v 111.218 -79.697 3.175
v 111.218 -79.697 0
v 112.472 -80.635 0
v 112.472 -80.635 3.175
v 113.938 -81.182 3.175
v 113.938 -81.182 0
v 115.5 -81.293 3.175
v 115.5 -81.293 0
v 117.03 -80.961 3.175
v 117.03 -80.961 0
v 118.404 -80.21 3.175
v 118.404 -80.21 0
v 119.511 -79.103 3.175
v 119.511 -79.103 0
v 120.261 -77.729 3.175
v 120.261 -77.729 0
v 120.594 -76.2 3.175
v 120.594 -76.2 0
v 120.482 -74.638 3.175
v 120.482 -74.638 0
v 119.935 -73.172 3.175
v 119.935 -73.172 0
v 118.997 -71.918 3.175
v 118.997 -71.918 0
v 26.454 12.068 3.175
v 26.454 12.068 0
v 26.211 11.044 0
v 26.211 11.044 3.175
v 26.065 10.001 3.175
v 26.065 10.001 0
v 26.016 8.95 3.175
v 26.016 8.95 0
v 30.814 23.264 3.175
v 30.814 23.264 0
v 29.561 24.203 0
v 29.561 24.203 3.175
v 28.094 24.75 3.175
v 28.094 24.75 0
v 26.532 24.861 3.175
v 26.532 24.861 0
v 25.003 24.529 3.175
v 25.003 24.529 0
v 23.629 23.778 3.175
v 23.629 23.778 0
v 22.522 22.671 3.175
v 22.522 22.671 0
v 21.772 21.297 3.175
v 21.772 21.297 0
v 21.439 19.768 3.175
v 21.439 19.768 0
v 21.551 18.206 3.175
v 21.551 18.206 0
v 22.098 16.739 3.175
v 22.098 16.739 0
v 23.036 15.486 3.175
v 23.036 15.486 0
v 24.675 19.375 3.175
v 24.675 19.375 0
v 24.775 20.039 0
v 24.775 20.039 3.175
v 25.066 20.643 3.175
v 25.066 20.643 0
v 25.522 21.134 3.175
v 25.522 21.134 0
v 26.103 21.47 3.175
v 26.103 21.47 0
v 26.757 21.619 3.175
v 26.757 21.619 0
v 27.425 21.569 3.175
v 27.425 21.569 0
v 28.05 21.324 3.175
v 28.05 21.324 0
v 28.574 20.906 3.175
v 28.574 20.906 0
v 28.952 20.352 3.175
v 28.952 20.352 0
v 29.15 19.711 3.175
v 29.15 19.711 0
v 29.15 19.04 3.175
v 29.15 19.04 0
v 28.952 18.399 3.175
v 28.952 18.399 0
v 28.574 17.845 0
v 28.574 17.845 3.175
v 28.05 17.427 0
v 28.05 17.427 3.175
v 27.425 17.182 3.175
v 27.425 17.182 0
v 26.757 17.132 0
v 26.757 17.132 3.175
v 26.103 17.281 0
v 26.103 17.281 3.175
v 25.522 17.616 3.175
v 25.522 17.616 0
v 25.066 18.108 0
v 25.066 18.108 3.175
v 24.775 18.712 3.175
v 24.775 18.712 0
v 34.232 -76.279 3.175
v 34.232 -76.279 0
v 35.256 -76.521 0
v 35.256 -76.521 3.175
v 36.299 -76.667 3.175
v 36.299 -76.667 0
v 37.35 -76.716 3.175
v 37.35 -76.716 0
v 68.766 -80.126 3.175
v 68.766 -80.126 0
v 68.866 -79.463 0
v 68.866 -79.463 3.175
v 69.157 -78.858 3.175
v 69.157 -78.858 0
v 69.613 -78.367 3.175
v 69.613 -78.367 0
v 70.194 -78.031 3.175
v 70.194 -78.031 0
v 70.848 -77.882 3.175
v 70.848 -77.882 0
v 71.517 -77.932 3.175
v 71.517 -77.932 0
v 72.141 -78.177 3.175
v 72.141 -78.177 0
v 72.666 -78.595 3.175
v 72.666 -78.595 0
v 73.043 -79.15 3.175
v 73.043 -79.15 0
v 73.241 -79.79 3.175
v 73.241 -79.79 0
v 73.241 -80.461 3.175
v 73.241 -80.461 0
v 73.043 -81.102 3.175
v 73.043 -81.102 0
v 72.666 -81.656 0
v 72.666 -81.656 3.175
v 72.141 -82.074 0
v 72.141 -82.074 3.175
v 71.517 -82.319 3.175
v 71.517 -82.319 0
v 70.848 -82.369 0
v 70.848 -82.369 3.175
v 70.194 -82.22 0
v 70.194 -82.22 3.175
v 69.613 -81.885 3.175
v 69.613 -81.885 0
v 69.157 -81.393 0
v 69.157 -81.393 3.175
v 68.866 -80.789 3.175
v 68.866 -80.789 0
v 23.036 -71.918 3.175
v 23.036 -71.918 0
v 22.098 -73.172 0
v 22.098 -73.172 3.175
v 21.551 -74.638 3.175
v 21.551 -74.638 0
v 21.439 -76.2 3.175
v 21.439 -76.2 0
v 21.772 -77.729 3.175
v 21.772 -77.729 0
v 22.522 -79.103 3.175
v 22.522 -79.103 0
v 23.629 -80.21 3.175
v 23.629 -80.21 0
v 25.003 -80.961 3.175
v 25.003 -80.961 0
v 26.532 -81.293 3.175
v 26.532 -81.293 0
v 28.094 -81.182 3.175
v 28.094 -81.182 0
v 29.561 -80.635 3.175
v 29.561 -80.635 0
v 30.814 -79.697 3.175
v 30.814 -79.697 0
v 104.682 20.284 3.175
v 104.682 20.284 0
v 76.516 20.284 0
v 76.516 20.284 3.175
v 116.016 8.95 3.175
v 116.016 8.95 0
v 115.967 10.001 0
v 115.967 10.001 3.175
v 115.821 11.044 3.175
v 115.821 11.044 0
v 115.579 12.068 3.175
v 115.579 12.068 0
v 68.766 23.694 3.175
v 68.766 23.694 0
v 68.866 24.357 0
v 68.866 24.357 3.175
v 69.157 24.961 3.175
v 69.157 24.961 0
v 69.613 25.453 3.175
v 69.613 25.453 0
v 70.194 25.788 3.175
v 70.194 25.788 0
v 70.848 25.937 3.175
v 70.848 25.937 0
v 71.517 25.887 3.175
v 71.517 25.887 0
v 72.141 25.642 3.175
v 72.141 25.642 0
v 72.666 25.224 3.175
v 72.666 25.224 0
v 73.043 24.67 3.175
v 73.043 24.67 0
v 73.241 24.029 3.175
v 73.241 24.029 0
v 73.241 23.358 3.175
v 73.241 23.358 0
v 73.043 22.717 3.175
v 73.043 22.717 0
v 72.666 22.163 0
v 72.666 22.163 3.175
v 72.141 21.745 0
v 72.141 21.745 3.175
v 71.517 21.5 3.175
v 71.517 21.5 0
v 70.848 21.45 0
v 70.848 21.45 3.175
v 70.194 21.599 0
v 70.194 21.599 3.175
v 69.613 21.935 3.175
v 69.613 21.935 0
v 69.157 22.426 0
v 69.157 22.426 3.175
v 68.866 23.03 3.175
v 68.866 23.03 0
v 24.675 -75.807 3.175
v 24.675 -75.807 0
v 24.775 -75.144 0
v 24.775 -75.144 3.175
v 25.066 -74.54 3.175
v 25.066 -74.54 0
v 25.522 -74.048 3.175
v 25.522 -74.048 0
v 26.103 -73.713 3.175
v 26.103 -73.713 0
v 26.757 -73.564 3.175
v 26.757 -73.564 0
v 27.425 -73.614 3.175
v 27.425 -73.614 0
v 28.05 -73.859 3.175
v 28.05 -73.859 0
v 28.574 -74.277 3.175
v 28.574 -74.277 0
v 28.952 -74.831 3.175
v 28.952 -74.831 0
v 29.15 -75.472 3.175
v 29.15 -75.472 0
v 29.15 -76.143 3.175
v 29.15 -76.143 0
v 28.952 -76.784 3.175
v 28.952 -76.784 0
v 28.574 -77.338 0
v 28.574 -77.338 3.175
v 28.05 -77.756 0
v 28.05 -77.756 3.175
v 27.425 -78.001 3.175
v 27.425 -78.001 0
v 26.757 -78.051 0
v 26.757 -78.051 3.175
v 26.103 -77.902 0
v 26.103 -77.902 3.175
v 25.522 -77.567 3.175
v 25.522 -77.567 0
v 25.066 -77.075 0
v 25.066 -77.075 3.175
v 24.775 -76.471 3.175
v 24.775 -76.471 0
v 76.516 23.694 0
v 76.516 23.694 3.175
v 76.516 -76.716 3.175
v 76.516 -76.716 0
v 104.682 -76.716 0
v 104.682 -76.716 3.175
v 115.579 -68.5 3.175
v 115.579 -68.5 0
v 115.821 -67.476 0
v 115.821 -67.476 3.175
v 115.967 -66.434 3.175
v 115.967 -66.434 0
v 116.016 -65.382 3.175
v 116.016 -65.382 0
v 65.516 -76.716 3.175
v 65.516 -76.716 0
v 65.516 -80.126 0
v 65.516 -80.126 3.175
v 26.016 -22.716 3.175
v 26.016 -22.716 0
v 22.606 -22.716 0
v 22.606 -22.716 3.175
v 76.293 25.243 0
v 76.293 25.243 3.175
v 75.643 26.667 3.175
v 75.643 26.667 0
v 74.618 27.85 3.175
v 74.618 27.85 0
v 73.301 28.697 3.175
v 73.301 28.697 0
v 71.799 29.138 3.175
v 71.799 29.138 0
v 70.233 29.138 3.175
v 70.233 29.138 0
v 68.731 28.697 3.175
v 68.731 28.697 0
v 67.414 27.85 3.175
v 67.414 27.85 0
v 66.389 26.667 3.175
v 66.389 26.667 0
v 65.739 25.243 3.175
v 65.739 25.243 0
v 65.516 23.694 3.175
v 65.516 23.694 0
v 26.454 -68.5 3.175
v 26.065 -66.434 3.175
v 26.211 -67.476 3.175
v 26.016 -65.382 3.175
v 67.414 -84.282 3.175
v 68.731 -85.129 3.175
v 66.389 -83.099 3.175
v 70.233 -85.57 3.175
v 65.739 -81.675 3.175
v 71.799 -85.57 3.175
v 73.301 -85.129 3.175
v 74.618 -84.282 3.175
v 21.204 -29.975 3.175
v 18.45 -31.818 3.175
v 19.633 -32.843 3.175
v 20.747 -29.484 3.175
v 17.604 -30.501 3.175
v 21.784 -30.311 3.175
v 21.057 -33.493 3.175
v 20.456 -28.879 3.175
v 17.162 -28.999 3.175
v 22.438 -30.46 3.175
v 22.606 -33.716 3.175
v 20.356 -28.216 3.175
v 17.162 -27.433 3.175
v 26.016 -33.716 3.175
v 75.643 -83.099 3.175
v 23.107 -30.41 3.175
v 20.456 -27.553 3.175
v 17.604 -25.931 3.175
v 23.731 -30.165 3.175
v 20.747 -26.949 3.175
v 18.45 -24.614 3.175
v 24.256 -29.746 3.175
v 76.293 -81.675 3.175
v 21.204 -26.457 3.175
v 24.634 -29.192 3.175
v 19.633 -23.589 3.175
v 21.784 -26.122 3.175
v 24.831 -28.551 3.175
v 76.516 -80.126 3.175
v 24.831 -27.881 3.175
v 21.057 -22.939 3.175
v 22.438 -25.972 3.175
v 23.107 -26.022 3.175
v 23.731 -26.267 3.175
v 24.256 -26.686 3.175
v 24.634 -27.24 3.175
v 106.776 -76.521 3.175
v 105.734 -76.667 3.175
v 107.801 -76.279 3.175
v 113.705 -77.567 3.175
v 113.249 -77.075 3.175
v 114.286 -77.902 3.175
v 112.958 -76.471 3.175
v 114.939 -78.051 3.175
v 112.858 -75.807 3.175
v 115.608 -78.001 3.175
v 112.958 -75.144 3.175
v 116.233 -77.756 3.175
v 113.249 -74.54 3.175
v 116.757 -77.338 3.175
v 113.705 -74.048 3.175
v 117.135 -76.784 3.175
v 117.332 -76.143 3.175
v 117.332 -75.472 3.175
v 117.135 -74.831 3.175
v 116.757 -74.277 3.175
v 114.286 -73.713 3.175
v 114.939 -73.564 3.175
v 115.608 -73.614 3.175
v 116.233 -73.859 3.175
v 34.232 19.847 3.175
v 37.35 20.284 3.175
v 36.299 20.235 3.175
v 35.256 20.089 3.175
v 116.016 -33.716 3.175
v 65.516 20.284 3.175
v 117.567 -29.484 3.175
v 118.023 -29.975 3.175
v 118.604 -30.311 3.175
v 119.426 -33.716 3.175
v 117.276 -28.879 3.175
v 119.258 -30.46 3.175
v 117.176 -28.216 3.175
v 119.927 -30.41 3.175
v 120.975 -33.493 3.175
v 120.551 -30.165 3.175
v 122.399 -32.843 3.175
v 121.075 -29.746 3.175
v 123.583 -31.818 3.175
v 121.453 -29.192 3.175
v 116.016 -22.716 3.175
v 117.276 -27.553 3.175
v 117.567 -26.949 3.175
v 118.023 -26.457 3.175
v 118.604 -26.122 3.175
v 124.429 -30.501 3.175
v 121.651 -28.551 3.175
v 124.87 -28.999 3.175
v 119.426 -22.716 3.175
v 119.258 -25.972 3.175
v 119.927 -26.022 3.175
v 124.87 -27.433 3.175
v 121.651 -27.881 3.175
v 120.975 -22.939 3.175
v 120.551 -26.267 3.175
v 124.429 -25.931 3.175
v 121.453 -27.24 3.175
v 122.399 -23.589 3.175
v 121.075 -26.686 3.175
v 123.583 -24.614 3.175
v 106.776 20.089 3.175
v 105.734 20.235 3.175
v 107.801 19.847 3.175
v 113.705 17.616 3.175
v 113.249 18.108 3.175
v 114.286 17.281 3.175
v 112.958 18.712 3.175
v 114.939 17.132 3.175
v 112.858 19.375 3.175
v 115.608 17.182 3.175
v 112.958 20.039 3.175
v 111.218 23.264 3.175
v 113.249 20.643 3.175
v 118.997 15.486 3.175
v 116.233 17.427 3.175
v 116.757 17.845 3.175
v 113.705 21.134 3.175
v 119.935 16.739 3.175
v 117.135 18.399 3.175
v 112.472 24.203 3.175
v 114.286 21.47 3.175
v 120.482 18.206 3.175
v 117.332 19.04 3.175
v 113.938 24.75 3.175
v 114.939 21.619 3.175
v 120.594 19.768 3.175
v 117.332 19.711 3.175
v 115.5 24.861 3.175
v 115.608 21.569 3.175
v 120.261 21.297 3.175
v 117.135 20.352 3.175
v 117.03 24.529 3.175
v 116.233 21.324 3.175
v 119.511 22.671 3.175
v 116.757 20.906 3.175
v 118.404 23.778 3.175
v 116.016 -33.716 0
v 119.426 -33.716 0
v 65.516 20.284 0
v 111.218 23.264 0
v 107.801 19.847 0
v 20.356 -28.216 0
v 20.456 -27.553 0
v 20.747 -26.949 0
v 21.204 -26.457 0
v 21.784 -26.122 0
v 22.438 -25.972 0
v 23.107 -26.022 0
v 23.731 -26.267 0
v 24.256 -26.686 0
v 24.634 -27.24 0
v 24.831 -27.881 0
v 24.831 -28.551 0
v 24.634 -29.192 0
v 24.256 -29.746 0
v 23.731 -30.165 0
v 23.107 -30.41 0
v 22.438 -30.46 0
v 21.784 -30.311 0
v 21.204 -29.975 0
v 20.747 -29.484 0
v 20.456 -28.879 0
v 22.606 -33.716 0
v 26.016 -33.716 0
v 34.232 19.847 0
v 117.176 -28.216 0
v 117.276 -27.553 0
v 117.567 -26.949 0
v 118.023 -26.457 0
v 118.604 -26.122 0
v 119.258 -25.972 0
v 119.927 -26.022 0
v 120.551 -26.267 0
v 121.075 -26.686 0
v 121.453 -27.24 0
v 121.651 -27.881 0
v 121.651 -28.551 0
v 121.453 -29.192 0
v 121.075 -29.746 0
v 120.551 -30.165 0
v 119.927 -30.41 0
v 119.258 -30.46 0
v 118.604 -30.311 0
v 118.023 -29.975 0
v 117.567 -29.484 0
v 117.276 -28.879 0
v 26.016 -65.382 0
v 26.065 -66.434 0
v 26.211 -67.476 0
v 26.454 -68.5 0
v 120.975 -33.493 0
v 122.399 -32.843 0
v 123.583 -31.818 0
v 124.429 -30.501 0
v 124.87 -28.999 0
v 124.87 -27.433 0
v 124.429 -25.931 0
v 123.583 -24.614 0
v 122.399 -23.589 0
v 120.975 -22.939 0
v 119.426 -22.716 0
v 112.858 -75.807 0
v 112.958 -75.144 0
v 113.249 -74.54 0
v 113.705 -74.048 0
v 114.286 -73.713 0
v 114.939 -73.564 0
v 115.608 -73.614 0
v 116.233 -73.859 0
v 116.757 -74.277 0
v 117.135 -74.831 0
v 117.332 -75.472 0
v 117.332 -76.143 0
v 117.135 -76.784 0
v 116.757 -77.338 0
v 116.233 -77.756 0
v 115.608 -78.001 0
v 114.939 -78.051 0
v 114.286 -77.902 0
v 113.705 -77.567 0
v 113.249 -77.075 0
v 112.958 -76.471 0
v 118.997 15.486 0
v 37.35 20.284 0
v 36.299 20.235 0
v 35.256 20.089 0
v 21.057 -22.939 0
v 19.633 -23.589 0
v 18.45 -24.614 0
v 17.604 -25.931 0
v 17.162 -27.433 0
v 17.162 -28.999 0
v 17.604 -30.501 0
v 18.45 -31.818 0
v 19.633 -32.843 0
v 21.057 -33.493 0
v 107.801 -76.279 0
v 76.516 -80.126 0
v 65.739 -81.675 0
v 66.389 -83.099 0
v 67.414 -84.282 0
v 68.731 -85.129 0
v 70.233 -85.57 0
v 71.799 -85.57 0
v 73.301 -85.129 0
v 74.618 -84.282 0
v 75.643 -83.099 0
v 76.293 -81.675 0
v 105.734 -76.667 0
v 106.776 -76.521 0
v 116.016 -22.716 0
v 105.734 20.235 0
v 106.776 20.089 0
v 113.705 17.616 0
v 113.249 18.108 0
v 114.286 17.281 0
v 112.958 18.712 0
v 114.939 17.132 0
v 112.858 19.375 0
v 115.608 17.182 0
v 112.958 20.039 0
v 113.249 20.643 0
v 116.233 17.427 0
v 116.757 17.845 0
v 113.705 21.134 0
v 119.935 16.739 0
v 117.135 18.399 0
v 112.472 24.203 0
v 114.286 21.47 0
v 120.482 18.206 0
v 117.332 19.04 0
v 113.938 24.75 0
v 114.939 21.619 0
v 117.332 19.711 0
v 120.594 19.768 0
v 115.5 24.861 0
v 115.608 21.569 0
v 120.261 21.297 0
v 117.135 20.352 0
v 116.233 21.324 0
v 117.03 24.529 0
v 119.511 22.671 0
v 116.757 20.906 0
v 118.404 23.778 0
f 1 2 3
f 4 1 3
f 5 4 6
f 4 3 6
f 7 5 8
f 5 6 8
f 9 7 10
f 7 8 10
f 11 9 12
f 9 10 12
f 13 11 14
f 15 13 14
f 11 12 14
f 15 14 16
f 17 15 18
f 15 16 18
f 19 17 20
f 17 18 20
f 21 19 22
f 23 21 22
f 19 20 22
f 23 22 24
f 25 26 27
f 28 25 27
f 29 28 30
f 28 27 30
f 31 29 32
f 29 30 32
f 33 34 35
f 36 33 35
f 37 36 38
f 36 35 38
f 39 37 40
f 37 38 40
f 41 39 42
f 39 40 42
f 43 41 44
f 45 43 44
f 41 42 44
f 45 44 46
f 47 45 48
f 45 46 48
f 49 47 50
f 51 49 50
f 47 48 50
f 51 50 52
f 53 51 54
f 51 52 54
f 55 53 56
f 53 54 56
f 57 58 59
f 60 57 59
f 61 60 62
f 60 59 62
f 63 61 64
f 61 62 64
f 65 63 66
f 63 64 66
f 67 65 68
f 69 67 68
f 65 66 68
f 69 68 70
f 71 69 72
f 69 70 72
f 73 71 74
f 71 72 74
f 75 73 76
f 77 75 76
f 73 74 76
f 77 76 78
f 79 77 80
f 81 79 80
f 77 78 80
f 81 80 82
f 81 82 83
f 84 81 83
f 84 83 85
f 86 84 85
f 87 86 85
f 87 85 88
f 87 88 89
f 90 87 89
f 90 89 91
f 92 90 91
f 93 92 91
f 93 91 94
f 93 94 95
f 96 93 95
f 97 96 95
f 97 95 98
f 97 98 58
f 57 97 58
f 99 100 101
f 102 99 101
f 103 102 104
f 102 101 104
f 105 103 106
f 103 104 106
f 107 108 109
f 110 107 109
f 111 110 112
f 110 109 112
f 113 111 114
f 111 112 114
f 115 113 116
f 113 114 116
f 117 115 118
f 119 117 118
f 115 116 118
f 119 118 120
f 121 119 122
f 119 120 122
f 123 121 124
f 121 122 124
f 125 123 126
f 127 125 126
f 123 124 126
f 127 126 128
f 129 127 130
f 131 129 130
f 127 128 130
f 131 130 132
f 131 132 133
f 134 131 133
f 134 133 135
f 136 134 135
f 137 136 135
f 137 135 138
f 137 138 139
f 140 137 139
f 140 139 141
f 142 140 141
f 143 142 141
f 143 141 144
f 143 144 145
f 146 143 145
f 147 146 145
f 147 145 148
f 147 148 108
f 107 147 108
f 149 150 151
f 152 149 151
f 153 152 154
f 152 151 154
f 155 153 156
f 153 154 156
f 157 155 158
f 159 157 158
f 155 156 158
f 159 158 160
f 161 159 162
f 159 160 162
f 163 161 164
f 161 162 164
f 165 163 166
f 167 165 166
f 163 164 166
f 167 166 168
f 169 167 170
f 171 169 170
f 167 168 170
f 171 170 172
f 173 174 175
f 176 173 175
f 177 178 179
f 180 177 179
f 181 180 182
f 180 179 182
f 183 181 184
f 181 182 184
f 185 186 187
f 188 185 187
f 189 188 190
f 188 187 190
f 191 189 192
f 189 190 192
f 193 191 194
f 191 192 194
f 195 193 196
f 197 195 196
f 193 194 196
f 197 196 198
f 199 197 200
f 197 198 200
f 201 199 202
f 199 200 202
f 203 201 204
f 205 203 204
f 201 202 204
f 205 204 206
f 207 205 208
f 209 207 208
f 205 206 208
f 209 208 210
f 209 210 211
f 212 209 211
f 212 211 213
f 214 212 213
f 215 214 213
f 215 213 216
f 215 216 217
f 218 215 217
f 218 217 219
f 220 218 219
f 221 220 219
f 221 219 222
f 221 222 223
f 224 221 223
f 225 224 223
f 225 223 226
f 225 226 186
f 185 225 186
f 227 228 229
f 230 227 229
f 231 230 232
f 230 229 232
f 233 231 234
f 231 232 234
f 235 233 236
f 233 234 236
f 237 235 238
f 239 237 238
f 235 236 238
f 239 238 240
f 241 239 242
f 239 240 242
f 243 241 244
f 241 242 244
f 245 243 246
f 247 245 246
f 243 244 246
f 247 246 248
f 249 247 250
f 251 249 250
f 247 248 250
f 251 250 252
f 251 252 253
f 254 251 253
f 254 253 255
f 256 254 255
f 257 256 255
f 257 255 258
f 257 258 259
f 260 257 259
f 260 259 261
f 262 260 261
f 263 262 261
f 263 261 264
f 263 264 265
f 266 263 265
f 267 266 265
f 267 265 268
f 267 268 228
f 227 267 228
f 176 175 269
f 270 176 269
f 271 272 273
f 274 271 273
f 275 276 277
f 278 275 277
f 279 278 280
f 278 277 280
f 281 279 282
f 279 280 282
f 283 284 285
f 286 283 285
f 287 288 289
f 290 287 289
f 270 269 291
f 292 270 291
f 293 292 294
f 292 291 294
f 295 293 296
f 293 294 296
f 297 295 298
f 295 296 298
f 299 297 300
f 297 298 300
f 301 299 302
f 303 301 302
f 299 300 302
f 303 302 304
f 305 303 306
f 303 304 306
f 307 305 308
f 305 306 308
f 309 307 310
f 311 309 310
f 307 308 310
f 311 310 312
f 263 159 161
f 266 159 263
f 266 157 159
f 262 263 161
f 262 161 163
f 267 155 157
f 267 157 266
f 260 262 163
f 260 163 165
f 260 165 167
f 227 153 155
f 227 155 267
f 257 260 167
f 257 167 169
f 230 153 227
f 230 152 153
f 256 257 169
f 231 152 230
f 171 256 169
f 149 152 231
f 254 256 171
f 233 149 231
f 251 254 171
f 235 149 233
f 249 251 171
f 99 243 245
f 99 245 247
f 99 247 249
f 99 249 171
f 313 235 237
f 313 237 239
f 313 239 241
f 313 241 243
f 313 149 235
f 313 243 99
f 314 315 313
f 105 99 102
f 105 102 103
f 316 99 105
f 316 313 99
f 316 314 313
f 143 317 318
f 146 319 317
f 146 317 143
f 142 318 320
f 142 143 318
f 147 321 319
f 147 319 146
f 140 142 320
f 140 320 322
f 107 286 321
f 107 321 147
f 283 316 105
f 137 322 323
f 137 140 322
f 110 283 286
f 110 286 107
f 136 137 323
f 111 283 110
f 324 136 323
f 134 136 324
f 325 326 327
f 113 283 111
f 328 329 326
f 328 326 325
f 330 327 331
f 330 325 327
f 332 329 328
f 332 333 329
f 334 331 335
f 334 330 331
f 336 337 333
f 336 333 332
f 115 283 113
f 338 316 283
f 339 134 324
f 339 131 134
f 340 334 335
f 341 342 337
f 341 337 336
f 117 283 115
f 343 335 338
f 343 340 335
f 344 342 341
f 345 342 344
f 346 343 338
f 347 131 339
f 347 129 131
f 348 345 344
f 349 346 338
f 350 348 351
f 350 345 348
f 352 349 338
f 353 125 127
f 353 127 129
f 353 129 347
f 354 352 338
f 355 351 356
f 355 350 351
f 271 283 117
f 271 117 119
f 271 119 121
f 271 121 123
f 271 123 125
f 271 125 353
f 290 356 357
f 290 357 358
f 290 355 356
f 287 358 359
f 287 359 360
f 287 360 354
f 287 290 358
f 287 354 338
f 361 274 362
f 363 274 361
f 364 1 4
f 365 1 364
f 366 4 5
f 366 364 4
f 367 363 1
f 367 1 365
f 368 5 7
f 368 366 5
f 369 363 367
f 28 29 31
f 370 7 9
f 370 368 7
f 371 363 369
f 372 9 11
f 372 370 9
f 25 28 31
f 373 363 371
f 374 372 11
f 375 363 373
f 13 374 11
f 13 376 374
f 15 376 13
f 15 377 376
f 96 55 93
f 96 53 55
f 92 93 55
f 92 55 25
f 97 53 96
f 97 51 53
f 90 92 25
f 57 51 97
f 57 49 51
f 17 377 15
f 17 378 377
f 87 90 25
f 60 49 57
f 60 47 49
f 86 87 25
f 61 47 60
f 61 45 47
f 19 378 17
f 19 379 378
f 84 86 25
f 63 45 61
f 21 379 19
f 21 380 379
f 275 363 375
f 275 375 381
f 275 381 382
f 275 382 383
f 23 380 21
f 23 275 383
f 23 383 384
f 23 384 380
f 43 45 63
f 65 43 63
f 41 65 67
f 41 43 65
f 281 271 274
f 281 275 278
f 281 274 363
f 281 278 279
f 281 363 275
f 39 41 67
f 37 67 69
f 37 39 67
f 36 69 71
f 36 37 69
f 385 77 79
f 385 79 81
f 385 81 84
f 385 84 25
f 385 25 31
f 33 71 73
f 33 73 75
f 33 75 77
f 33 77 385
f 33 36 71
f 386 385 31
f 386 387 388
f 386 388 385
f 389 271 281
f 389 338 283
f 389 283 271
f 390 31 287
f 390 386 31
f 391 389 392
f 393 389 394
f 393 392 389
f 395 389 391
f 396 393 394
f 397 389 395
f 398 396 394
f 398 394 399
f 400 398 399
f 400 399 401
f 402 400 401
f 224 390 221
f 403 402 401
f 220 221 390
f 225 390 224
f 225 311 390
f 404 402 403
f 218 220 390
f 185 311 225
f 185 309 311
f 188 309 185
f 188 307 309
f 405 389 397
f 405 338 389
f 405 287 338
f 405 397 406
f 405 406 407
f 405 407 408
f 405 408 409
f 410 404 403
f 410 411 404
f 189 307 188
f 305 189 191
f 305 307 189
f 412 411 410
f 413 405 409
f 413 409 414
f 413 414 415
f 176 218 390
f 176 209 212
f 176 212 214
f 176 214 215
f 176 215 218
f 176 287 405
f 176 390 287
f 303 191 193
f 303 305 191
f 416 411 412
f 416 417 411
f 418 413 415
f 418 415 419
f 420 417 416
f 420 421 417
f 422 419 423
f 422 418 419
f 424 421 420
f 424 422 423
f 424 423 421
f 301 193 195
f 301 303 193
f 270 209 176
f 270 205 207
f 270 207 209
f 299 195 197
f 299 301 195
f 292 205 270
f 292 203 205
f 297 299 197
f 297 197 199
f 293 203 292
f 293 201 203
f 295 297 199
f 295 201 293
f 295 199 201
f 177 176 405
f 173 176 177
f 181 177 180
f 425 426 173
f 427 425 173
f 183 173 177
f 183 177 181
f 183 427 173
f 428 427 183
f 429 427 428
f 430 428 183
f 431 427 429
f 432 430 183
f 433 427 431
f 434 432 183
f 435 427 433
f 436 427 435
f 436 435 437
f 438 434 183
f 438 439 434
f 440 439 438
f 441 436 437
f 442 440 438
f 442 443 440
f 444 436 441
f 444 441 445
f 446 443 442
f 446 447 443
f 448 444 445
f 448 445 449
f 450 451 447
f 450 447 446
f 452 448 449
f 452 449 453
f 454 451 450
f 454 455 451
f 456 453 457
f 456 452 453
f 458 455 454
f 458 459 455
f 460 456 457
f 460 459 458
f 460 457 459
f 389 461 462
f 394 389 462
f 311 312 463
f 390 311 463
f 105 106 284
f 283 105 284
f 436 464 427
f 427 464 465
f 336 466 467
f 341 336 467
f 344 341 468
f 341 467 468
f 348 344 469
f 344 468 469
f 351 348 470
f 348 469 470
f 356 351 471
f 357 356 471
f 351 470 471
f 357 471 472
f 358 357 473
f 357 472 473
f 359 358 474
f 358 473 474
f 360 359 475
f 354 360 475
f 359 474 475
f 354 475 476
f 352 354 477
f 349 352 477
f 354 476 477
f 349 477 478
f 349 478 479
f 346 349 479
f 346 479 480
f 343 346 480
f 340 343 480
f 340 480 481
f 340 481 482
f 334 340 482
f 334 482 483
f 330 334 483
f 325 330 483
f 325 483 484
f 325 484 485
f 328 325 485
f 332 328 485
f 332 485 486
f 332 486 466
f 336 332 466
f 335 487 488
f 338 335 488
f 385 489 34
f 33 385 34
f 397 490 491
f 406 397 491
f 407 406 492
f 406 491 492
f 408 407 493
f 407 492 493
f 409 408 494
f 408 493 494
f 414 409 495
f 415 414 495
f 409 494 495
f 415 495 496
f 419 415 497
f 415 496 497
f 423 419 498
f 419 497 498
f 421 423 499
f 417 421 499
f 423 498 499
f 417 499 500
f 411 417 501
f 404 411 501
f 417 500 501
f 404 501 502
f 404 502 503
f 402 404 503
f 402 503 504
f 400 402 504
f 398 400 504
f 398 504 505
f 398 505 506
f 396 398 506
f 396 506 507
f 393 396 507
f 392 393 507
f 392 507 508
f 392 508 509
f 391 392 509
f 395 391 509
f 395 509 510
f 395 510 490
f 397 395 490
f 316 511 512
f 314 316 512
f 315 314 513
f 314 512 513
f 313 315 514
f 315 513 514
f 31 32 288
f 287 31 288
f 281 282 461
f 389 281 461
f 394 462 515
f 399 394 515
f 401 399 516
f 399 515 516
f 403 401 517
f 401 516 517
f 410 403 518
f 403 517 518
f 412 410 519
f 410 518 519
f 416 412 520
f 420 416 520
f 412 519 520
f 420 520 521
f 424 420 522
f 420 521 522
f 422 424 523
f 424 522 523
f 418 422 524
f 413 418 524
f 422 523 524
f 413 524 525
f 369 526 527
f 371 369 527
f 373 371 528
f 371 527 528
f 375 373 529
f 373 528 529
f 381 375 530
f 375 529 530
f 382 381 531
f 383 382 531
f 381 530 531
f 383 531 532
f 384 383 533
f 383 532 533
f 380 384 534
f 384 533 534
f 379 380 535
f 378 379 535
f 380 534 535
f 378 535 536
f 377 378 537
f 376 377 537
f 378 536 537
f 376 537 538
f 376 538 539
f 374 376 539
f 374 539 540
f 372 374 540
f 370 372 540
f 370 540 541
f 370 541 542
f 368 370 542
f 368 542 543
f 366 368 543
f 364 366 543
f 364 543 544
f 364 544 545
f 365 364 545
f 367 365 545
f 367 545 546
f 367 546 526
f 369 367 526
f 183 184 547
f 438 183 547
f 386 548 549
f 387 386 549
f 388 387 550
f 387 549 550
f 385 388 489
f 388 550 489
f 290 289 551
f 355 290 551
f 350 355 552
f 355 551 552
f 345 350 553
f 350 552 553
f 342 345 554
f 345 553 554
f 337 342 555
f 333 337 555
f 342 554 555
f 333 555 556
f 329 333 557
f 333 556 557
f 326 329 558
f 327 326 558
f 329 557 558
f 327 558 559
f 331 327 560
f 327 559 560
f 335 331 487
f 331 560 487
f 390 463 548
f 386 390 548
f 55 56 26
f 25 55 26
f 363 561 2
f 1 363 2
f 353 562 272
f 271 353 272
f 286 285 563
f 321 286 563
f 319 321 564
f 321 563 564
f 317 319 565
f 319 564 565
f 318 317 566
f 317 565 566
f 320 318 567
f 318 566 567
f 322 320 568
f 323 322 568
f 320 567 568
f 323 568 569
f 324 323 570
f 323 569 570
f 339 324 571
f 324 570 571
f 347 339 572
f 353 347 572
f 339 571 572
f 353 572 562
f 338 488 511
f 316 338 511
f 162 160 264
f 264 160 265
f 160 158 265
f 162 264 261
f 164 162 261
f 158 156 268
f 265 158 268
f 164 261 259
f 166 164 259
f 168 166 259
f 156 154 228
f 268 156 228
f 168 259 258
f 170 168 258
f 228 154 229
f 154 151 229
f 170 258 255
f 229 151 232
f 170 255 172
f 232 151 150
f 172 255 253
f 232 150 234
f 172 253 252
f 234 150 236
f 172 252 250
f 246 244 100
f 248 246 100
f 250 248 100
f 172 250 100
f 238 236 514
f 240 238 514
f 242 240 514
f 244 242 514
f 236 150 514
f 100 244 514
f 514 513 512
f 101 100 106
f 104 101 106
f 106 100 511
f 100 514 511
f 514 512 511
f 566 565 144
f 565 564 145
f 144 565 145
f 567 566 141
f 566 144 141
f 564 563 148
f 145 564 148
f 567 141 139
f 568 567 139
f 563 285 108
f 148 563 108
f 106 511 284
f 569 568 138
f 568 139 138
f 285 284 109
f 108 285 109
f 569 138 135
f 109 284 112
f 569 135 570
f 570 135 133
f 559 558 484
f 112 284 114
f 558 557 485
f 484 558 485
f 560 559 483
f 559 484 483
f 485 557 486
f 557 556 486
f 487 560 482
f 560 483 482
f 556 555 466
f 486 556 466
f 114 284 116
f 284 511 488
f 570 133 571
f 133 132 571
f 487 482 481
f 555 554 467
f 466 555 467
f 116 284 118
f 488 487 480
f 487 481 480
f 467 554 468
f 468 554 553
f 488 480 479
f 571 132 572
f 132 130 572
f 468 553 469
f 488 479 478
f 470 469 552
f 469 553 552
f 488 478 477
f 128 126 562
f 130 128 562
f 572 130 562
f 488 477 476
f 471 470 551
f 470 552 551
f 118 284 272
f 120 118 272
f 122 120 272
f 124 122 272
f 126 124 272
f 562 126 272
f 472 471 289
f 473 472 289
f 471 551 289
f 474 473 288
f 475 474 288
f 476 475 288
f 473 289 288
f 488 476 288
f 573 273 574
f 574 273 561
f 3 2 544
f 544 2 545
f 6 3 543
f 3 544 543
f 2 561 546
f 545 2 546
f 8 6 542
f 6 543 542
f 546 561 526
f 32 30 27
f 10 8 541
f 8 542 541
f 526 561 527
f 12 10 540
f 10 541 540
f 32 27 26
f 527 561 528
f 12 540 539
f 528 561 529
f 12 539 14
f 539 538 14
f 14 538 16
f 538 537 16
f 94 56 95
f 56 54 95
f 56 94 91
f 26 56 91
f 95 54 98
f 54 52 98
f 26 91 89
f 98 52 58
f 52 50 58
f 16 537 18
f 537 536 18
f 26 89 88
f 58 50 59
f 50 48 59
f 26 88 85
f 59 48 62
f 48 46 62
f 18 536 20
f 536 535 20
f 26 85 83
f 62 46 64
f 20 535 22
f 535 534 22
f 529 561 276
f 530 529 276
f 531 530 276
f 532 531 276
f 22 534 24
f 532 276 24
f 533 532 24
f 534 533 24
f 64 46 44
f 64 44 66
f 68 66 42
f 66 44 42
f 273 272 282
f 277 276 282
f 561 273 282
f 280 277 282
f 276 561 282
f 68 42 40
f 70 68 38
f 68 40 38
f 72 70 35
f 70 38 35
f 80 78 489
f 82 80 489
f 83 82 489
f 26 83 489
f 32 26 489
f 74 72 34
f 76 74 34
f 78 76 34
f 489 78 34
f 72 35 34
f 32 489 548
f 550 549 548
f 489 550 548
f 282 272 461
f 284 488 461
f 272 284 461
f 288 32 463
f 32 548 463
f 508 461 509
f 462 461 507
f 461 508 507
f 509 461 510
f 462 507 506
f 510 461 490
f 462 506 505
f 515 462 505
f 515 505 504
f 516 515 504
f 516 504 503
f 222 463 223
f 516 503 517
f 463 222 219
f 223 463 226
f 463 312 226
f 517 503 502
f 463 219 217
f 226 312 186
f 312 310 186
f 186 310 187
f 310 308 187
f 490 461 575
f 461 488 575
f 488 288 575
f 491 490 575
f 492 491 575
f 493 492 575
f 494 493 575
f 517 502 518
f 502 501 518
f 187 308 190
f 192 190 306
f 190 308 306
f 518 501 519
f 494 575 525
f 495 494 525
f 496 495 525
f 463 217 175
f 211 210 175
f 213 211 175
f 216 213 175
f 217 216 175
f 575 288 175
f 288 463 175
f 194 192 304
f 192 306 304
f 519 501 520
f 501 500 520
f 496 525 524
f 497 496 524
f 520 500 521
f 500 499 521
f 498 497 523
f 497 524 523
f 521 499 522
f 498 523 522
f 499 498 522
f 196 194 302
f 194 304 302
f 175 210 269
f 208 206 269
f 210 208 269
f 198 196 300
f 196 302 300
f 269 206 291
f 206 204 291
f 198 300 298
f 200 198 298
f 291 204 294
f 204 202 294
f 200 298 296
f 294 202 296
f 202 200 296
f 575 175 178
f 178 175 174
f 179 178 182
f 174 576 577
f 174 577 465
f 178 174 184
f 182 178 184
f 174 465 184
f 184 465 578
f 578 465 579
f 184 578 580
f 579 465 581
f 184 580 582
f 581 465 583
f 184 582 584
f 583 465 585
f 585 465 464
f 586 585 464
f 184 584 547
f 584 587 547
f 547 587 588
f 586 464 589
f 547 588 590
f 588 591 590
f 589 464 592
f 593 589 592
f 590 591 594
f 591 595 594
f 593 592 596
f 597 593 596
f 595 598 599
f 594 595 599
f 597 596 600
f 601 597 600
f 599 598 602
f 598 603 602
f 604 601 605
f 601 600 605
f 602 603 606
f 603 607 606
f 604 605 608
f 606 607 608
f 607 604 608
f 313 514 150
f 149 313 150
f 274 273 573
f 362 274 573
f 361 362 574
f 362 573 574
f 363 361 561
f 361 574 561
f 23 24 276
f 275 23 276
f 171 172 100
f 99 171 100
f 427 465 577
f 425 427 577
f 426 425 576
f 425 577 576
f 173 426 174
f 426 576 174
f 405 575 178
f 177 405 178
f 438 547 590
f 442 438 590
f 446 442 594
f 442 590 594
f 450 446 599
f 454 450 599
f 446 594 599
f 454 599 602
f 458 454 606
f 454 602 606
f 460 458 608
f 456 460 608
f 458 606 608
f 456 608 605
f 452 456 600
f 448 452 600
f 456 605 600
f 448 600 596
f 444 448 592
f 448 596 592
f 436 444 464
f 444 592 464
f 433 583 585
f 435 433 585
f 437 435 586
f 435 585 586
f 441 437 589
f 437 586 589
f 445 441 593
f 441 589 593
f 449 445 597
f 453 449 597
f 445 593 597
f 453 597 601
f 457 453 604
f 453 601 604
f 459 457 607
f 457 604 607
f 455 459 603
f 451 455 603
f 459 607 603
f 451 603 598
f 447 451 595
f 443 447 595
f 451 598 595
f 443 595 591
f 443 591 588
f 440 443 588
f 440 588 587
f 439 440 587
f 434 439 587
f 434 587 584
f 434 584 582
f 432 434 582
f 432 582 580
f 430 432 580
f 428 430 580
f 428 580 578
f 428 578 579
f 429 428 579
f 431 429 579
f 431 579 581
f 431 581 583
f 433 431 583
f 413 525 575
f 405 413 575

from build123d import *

# Parameters (mm, degrees)
BOSS_EXTRUDE1_DEPTH  = 3.175
M4_CLEARANCE_HOLE1_D = 4.5


with BuildPart() as part:
    # Sketch1 → Boss-Extrude1 (new body)
    with BuildSketch(Plane.XY):
        with BuildLine():
            Line((37.350187889, -76.716042997), (65.516187889, -76.716042997))
            Line((65.516187889, -76.716042997), (65.516187889, -80.125742997))
            ThreePointArc((65.516187889, -80.125742997), (71.016187889, -85.625742997), (76.516187889, -80.125742997))
            Line((76.516187889, -80.125742997), (76.516187889, -76.716042997))
            Line((76.516187889, -76.716042997), (104.682187889, -76.716042997))
            ThreePointArc((104.682187889, -76.716042997), (106.256649797, -76.606152124), (107.800580738, -76.278610439))
            Line((107.800580738, -76.278610439), (111.218470842, -79.696500543))
            ThreePointArc((111.218470842, -79.696500543), (118.996645435, -79.696500543), (118.996645435, -71.91832595))
            Line((118.996645435, -71.91832595), (115.578755331, -68.500435846))
            ThreePointArc((115.578755331, -68.500435846), (115.906297016, -66.956504905), (116.016187889, -65.382042997))
            Line((116.016187889, -65.382042997), (116.016187889, -33.716042997))
            Line((116.016187889, -33.716042997), (119.425887889, -33.716042997))
            ThreePointArc((119.425887889, -33.716042997), (124.925887889, -28.216042997), (119.425887889, -22.716042997))
            Line((119.425887889, -22.716042997), (116.016187889, -22.716042997))
            Line((116.016187889, -22.716042997), (116.016187889, 8.949957003))
            ThreePointArc((116.016187889, 8.949957003), (115.906297016, 10.524418912), (115.578755331, 12.068349853))
            Line((115.578755331, 12.068349853), (118.996645435, 15.486239957))
            ThreePointArc((118.996645435, 15.486239957), (118.996645435, 23.26441455), (111.218470842, 23.26441455))
            Line((111.218470842, 23.26441455), (107.800580738, 19.846524446))
            ThreePointArc((107.800580738, 19.846524446), (106.256649797, 20.174066131), (104.682187889, 20.283957003))
            Line((104.682187889, 20.283957003), (76.516187889, 20.283957003))
            Line((76.516187889, 20.283957003), (76.516187889, 23.693657003))
            ThreePointArc((76.516187889, 23.693657003), (71.016187889, 29.193657003), (65.516187889, 23.693657003))
            Line((65.516187889, 23.693657003), (65.516187889, 20.283957003))
            Line((65.516187889, 20.283957003), (37.350187889, 20.283957003))
            ThreePointArc((37.350187889, 20.283957003), (35.77572598, 20.174066131), (34.231795039, 19.846524446))
            Line((34.231795039, 19.846524446), (30.813904935, 23.26441455))
            ThreePointArc((30.813904935, 23.26441455), (23.035730342, 23.26441455), (23.035730342, 15.486239957))
            Line((23.035730342, 15.486239957), (26.453620446, 12.068349853))
            ThreePointArc((26.453620446, 12.068349853), (26.126078761, 10.524418912), (26.016187889, 8.949957003))
            Line((26.016187889, 8.949957003), (26.016187889, -22.716042997))
            Line((26.016187889, -22.716042997), (22.606487889, -22.716042997))
            ThreePointArc((22.606487889, -22.716042997), (17.106487889, -28.216042997), (22.606487889, -33.716042997))
            Line((22.606487889, -33.716042997), (26.016187889, -33.716042997))
            Line((26.016187889, -33.716042997), (26.016187889, -65.382042997))
            ThreePointArc((26.016187889, -65.382042997), (26.126078761, -66.956504905), (26.453620446, -68.500435846))
            Line((26.453620446, -68.500435846), (23.035730342, -71.91832595))
            ThreePointArc((23.035730342, -71.91832595), (23.035730342, -79.696500543), (30.813904935, -79.696500543))
            Line((30.813904935, -79.696500543), (34.231795039, -76.278610439))
            ThreePointArc((34.231795039, -76.278610439), (35.77572598, -76.606152124), (37.350187889, -76.716042997))
        make_face()
    extrude(amount=BOSS_EXTRUDE1_DEPTH)

    # M4 Clearance Hole1 (through all)
    with Locations(Plane.XY.offset(3.175)):
        with Locations((26.924817639, -75.807413246), (22.606487889, -28.216042997), (71.016187889, -80.125742997), (115.107558138, -75.807413246), (119.425887889, -28.216042997), (115.107558138, 19.375327253), (71.016187889, 23.693657003), (26.924817639, 19.375327253)):
            Hole(M4_CLEARANCE_HOLE1_D / 2)


solid = part.part
